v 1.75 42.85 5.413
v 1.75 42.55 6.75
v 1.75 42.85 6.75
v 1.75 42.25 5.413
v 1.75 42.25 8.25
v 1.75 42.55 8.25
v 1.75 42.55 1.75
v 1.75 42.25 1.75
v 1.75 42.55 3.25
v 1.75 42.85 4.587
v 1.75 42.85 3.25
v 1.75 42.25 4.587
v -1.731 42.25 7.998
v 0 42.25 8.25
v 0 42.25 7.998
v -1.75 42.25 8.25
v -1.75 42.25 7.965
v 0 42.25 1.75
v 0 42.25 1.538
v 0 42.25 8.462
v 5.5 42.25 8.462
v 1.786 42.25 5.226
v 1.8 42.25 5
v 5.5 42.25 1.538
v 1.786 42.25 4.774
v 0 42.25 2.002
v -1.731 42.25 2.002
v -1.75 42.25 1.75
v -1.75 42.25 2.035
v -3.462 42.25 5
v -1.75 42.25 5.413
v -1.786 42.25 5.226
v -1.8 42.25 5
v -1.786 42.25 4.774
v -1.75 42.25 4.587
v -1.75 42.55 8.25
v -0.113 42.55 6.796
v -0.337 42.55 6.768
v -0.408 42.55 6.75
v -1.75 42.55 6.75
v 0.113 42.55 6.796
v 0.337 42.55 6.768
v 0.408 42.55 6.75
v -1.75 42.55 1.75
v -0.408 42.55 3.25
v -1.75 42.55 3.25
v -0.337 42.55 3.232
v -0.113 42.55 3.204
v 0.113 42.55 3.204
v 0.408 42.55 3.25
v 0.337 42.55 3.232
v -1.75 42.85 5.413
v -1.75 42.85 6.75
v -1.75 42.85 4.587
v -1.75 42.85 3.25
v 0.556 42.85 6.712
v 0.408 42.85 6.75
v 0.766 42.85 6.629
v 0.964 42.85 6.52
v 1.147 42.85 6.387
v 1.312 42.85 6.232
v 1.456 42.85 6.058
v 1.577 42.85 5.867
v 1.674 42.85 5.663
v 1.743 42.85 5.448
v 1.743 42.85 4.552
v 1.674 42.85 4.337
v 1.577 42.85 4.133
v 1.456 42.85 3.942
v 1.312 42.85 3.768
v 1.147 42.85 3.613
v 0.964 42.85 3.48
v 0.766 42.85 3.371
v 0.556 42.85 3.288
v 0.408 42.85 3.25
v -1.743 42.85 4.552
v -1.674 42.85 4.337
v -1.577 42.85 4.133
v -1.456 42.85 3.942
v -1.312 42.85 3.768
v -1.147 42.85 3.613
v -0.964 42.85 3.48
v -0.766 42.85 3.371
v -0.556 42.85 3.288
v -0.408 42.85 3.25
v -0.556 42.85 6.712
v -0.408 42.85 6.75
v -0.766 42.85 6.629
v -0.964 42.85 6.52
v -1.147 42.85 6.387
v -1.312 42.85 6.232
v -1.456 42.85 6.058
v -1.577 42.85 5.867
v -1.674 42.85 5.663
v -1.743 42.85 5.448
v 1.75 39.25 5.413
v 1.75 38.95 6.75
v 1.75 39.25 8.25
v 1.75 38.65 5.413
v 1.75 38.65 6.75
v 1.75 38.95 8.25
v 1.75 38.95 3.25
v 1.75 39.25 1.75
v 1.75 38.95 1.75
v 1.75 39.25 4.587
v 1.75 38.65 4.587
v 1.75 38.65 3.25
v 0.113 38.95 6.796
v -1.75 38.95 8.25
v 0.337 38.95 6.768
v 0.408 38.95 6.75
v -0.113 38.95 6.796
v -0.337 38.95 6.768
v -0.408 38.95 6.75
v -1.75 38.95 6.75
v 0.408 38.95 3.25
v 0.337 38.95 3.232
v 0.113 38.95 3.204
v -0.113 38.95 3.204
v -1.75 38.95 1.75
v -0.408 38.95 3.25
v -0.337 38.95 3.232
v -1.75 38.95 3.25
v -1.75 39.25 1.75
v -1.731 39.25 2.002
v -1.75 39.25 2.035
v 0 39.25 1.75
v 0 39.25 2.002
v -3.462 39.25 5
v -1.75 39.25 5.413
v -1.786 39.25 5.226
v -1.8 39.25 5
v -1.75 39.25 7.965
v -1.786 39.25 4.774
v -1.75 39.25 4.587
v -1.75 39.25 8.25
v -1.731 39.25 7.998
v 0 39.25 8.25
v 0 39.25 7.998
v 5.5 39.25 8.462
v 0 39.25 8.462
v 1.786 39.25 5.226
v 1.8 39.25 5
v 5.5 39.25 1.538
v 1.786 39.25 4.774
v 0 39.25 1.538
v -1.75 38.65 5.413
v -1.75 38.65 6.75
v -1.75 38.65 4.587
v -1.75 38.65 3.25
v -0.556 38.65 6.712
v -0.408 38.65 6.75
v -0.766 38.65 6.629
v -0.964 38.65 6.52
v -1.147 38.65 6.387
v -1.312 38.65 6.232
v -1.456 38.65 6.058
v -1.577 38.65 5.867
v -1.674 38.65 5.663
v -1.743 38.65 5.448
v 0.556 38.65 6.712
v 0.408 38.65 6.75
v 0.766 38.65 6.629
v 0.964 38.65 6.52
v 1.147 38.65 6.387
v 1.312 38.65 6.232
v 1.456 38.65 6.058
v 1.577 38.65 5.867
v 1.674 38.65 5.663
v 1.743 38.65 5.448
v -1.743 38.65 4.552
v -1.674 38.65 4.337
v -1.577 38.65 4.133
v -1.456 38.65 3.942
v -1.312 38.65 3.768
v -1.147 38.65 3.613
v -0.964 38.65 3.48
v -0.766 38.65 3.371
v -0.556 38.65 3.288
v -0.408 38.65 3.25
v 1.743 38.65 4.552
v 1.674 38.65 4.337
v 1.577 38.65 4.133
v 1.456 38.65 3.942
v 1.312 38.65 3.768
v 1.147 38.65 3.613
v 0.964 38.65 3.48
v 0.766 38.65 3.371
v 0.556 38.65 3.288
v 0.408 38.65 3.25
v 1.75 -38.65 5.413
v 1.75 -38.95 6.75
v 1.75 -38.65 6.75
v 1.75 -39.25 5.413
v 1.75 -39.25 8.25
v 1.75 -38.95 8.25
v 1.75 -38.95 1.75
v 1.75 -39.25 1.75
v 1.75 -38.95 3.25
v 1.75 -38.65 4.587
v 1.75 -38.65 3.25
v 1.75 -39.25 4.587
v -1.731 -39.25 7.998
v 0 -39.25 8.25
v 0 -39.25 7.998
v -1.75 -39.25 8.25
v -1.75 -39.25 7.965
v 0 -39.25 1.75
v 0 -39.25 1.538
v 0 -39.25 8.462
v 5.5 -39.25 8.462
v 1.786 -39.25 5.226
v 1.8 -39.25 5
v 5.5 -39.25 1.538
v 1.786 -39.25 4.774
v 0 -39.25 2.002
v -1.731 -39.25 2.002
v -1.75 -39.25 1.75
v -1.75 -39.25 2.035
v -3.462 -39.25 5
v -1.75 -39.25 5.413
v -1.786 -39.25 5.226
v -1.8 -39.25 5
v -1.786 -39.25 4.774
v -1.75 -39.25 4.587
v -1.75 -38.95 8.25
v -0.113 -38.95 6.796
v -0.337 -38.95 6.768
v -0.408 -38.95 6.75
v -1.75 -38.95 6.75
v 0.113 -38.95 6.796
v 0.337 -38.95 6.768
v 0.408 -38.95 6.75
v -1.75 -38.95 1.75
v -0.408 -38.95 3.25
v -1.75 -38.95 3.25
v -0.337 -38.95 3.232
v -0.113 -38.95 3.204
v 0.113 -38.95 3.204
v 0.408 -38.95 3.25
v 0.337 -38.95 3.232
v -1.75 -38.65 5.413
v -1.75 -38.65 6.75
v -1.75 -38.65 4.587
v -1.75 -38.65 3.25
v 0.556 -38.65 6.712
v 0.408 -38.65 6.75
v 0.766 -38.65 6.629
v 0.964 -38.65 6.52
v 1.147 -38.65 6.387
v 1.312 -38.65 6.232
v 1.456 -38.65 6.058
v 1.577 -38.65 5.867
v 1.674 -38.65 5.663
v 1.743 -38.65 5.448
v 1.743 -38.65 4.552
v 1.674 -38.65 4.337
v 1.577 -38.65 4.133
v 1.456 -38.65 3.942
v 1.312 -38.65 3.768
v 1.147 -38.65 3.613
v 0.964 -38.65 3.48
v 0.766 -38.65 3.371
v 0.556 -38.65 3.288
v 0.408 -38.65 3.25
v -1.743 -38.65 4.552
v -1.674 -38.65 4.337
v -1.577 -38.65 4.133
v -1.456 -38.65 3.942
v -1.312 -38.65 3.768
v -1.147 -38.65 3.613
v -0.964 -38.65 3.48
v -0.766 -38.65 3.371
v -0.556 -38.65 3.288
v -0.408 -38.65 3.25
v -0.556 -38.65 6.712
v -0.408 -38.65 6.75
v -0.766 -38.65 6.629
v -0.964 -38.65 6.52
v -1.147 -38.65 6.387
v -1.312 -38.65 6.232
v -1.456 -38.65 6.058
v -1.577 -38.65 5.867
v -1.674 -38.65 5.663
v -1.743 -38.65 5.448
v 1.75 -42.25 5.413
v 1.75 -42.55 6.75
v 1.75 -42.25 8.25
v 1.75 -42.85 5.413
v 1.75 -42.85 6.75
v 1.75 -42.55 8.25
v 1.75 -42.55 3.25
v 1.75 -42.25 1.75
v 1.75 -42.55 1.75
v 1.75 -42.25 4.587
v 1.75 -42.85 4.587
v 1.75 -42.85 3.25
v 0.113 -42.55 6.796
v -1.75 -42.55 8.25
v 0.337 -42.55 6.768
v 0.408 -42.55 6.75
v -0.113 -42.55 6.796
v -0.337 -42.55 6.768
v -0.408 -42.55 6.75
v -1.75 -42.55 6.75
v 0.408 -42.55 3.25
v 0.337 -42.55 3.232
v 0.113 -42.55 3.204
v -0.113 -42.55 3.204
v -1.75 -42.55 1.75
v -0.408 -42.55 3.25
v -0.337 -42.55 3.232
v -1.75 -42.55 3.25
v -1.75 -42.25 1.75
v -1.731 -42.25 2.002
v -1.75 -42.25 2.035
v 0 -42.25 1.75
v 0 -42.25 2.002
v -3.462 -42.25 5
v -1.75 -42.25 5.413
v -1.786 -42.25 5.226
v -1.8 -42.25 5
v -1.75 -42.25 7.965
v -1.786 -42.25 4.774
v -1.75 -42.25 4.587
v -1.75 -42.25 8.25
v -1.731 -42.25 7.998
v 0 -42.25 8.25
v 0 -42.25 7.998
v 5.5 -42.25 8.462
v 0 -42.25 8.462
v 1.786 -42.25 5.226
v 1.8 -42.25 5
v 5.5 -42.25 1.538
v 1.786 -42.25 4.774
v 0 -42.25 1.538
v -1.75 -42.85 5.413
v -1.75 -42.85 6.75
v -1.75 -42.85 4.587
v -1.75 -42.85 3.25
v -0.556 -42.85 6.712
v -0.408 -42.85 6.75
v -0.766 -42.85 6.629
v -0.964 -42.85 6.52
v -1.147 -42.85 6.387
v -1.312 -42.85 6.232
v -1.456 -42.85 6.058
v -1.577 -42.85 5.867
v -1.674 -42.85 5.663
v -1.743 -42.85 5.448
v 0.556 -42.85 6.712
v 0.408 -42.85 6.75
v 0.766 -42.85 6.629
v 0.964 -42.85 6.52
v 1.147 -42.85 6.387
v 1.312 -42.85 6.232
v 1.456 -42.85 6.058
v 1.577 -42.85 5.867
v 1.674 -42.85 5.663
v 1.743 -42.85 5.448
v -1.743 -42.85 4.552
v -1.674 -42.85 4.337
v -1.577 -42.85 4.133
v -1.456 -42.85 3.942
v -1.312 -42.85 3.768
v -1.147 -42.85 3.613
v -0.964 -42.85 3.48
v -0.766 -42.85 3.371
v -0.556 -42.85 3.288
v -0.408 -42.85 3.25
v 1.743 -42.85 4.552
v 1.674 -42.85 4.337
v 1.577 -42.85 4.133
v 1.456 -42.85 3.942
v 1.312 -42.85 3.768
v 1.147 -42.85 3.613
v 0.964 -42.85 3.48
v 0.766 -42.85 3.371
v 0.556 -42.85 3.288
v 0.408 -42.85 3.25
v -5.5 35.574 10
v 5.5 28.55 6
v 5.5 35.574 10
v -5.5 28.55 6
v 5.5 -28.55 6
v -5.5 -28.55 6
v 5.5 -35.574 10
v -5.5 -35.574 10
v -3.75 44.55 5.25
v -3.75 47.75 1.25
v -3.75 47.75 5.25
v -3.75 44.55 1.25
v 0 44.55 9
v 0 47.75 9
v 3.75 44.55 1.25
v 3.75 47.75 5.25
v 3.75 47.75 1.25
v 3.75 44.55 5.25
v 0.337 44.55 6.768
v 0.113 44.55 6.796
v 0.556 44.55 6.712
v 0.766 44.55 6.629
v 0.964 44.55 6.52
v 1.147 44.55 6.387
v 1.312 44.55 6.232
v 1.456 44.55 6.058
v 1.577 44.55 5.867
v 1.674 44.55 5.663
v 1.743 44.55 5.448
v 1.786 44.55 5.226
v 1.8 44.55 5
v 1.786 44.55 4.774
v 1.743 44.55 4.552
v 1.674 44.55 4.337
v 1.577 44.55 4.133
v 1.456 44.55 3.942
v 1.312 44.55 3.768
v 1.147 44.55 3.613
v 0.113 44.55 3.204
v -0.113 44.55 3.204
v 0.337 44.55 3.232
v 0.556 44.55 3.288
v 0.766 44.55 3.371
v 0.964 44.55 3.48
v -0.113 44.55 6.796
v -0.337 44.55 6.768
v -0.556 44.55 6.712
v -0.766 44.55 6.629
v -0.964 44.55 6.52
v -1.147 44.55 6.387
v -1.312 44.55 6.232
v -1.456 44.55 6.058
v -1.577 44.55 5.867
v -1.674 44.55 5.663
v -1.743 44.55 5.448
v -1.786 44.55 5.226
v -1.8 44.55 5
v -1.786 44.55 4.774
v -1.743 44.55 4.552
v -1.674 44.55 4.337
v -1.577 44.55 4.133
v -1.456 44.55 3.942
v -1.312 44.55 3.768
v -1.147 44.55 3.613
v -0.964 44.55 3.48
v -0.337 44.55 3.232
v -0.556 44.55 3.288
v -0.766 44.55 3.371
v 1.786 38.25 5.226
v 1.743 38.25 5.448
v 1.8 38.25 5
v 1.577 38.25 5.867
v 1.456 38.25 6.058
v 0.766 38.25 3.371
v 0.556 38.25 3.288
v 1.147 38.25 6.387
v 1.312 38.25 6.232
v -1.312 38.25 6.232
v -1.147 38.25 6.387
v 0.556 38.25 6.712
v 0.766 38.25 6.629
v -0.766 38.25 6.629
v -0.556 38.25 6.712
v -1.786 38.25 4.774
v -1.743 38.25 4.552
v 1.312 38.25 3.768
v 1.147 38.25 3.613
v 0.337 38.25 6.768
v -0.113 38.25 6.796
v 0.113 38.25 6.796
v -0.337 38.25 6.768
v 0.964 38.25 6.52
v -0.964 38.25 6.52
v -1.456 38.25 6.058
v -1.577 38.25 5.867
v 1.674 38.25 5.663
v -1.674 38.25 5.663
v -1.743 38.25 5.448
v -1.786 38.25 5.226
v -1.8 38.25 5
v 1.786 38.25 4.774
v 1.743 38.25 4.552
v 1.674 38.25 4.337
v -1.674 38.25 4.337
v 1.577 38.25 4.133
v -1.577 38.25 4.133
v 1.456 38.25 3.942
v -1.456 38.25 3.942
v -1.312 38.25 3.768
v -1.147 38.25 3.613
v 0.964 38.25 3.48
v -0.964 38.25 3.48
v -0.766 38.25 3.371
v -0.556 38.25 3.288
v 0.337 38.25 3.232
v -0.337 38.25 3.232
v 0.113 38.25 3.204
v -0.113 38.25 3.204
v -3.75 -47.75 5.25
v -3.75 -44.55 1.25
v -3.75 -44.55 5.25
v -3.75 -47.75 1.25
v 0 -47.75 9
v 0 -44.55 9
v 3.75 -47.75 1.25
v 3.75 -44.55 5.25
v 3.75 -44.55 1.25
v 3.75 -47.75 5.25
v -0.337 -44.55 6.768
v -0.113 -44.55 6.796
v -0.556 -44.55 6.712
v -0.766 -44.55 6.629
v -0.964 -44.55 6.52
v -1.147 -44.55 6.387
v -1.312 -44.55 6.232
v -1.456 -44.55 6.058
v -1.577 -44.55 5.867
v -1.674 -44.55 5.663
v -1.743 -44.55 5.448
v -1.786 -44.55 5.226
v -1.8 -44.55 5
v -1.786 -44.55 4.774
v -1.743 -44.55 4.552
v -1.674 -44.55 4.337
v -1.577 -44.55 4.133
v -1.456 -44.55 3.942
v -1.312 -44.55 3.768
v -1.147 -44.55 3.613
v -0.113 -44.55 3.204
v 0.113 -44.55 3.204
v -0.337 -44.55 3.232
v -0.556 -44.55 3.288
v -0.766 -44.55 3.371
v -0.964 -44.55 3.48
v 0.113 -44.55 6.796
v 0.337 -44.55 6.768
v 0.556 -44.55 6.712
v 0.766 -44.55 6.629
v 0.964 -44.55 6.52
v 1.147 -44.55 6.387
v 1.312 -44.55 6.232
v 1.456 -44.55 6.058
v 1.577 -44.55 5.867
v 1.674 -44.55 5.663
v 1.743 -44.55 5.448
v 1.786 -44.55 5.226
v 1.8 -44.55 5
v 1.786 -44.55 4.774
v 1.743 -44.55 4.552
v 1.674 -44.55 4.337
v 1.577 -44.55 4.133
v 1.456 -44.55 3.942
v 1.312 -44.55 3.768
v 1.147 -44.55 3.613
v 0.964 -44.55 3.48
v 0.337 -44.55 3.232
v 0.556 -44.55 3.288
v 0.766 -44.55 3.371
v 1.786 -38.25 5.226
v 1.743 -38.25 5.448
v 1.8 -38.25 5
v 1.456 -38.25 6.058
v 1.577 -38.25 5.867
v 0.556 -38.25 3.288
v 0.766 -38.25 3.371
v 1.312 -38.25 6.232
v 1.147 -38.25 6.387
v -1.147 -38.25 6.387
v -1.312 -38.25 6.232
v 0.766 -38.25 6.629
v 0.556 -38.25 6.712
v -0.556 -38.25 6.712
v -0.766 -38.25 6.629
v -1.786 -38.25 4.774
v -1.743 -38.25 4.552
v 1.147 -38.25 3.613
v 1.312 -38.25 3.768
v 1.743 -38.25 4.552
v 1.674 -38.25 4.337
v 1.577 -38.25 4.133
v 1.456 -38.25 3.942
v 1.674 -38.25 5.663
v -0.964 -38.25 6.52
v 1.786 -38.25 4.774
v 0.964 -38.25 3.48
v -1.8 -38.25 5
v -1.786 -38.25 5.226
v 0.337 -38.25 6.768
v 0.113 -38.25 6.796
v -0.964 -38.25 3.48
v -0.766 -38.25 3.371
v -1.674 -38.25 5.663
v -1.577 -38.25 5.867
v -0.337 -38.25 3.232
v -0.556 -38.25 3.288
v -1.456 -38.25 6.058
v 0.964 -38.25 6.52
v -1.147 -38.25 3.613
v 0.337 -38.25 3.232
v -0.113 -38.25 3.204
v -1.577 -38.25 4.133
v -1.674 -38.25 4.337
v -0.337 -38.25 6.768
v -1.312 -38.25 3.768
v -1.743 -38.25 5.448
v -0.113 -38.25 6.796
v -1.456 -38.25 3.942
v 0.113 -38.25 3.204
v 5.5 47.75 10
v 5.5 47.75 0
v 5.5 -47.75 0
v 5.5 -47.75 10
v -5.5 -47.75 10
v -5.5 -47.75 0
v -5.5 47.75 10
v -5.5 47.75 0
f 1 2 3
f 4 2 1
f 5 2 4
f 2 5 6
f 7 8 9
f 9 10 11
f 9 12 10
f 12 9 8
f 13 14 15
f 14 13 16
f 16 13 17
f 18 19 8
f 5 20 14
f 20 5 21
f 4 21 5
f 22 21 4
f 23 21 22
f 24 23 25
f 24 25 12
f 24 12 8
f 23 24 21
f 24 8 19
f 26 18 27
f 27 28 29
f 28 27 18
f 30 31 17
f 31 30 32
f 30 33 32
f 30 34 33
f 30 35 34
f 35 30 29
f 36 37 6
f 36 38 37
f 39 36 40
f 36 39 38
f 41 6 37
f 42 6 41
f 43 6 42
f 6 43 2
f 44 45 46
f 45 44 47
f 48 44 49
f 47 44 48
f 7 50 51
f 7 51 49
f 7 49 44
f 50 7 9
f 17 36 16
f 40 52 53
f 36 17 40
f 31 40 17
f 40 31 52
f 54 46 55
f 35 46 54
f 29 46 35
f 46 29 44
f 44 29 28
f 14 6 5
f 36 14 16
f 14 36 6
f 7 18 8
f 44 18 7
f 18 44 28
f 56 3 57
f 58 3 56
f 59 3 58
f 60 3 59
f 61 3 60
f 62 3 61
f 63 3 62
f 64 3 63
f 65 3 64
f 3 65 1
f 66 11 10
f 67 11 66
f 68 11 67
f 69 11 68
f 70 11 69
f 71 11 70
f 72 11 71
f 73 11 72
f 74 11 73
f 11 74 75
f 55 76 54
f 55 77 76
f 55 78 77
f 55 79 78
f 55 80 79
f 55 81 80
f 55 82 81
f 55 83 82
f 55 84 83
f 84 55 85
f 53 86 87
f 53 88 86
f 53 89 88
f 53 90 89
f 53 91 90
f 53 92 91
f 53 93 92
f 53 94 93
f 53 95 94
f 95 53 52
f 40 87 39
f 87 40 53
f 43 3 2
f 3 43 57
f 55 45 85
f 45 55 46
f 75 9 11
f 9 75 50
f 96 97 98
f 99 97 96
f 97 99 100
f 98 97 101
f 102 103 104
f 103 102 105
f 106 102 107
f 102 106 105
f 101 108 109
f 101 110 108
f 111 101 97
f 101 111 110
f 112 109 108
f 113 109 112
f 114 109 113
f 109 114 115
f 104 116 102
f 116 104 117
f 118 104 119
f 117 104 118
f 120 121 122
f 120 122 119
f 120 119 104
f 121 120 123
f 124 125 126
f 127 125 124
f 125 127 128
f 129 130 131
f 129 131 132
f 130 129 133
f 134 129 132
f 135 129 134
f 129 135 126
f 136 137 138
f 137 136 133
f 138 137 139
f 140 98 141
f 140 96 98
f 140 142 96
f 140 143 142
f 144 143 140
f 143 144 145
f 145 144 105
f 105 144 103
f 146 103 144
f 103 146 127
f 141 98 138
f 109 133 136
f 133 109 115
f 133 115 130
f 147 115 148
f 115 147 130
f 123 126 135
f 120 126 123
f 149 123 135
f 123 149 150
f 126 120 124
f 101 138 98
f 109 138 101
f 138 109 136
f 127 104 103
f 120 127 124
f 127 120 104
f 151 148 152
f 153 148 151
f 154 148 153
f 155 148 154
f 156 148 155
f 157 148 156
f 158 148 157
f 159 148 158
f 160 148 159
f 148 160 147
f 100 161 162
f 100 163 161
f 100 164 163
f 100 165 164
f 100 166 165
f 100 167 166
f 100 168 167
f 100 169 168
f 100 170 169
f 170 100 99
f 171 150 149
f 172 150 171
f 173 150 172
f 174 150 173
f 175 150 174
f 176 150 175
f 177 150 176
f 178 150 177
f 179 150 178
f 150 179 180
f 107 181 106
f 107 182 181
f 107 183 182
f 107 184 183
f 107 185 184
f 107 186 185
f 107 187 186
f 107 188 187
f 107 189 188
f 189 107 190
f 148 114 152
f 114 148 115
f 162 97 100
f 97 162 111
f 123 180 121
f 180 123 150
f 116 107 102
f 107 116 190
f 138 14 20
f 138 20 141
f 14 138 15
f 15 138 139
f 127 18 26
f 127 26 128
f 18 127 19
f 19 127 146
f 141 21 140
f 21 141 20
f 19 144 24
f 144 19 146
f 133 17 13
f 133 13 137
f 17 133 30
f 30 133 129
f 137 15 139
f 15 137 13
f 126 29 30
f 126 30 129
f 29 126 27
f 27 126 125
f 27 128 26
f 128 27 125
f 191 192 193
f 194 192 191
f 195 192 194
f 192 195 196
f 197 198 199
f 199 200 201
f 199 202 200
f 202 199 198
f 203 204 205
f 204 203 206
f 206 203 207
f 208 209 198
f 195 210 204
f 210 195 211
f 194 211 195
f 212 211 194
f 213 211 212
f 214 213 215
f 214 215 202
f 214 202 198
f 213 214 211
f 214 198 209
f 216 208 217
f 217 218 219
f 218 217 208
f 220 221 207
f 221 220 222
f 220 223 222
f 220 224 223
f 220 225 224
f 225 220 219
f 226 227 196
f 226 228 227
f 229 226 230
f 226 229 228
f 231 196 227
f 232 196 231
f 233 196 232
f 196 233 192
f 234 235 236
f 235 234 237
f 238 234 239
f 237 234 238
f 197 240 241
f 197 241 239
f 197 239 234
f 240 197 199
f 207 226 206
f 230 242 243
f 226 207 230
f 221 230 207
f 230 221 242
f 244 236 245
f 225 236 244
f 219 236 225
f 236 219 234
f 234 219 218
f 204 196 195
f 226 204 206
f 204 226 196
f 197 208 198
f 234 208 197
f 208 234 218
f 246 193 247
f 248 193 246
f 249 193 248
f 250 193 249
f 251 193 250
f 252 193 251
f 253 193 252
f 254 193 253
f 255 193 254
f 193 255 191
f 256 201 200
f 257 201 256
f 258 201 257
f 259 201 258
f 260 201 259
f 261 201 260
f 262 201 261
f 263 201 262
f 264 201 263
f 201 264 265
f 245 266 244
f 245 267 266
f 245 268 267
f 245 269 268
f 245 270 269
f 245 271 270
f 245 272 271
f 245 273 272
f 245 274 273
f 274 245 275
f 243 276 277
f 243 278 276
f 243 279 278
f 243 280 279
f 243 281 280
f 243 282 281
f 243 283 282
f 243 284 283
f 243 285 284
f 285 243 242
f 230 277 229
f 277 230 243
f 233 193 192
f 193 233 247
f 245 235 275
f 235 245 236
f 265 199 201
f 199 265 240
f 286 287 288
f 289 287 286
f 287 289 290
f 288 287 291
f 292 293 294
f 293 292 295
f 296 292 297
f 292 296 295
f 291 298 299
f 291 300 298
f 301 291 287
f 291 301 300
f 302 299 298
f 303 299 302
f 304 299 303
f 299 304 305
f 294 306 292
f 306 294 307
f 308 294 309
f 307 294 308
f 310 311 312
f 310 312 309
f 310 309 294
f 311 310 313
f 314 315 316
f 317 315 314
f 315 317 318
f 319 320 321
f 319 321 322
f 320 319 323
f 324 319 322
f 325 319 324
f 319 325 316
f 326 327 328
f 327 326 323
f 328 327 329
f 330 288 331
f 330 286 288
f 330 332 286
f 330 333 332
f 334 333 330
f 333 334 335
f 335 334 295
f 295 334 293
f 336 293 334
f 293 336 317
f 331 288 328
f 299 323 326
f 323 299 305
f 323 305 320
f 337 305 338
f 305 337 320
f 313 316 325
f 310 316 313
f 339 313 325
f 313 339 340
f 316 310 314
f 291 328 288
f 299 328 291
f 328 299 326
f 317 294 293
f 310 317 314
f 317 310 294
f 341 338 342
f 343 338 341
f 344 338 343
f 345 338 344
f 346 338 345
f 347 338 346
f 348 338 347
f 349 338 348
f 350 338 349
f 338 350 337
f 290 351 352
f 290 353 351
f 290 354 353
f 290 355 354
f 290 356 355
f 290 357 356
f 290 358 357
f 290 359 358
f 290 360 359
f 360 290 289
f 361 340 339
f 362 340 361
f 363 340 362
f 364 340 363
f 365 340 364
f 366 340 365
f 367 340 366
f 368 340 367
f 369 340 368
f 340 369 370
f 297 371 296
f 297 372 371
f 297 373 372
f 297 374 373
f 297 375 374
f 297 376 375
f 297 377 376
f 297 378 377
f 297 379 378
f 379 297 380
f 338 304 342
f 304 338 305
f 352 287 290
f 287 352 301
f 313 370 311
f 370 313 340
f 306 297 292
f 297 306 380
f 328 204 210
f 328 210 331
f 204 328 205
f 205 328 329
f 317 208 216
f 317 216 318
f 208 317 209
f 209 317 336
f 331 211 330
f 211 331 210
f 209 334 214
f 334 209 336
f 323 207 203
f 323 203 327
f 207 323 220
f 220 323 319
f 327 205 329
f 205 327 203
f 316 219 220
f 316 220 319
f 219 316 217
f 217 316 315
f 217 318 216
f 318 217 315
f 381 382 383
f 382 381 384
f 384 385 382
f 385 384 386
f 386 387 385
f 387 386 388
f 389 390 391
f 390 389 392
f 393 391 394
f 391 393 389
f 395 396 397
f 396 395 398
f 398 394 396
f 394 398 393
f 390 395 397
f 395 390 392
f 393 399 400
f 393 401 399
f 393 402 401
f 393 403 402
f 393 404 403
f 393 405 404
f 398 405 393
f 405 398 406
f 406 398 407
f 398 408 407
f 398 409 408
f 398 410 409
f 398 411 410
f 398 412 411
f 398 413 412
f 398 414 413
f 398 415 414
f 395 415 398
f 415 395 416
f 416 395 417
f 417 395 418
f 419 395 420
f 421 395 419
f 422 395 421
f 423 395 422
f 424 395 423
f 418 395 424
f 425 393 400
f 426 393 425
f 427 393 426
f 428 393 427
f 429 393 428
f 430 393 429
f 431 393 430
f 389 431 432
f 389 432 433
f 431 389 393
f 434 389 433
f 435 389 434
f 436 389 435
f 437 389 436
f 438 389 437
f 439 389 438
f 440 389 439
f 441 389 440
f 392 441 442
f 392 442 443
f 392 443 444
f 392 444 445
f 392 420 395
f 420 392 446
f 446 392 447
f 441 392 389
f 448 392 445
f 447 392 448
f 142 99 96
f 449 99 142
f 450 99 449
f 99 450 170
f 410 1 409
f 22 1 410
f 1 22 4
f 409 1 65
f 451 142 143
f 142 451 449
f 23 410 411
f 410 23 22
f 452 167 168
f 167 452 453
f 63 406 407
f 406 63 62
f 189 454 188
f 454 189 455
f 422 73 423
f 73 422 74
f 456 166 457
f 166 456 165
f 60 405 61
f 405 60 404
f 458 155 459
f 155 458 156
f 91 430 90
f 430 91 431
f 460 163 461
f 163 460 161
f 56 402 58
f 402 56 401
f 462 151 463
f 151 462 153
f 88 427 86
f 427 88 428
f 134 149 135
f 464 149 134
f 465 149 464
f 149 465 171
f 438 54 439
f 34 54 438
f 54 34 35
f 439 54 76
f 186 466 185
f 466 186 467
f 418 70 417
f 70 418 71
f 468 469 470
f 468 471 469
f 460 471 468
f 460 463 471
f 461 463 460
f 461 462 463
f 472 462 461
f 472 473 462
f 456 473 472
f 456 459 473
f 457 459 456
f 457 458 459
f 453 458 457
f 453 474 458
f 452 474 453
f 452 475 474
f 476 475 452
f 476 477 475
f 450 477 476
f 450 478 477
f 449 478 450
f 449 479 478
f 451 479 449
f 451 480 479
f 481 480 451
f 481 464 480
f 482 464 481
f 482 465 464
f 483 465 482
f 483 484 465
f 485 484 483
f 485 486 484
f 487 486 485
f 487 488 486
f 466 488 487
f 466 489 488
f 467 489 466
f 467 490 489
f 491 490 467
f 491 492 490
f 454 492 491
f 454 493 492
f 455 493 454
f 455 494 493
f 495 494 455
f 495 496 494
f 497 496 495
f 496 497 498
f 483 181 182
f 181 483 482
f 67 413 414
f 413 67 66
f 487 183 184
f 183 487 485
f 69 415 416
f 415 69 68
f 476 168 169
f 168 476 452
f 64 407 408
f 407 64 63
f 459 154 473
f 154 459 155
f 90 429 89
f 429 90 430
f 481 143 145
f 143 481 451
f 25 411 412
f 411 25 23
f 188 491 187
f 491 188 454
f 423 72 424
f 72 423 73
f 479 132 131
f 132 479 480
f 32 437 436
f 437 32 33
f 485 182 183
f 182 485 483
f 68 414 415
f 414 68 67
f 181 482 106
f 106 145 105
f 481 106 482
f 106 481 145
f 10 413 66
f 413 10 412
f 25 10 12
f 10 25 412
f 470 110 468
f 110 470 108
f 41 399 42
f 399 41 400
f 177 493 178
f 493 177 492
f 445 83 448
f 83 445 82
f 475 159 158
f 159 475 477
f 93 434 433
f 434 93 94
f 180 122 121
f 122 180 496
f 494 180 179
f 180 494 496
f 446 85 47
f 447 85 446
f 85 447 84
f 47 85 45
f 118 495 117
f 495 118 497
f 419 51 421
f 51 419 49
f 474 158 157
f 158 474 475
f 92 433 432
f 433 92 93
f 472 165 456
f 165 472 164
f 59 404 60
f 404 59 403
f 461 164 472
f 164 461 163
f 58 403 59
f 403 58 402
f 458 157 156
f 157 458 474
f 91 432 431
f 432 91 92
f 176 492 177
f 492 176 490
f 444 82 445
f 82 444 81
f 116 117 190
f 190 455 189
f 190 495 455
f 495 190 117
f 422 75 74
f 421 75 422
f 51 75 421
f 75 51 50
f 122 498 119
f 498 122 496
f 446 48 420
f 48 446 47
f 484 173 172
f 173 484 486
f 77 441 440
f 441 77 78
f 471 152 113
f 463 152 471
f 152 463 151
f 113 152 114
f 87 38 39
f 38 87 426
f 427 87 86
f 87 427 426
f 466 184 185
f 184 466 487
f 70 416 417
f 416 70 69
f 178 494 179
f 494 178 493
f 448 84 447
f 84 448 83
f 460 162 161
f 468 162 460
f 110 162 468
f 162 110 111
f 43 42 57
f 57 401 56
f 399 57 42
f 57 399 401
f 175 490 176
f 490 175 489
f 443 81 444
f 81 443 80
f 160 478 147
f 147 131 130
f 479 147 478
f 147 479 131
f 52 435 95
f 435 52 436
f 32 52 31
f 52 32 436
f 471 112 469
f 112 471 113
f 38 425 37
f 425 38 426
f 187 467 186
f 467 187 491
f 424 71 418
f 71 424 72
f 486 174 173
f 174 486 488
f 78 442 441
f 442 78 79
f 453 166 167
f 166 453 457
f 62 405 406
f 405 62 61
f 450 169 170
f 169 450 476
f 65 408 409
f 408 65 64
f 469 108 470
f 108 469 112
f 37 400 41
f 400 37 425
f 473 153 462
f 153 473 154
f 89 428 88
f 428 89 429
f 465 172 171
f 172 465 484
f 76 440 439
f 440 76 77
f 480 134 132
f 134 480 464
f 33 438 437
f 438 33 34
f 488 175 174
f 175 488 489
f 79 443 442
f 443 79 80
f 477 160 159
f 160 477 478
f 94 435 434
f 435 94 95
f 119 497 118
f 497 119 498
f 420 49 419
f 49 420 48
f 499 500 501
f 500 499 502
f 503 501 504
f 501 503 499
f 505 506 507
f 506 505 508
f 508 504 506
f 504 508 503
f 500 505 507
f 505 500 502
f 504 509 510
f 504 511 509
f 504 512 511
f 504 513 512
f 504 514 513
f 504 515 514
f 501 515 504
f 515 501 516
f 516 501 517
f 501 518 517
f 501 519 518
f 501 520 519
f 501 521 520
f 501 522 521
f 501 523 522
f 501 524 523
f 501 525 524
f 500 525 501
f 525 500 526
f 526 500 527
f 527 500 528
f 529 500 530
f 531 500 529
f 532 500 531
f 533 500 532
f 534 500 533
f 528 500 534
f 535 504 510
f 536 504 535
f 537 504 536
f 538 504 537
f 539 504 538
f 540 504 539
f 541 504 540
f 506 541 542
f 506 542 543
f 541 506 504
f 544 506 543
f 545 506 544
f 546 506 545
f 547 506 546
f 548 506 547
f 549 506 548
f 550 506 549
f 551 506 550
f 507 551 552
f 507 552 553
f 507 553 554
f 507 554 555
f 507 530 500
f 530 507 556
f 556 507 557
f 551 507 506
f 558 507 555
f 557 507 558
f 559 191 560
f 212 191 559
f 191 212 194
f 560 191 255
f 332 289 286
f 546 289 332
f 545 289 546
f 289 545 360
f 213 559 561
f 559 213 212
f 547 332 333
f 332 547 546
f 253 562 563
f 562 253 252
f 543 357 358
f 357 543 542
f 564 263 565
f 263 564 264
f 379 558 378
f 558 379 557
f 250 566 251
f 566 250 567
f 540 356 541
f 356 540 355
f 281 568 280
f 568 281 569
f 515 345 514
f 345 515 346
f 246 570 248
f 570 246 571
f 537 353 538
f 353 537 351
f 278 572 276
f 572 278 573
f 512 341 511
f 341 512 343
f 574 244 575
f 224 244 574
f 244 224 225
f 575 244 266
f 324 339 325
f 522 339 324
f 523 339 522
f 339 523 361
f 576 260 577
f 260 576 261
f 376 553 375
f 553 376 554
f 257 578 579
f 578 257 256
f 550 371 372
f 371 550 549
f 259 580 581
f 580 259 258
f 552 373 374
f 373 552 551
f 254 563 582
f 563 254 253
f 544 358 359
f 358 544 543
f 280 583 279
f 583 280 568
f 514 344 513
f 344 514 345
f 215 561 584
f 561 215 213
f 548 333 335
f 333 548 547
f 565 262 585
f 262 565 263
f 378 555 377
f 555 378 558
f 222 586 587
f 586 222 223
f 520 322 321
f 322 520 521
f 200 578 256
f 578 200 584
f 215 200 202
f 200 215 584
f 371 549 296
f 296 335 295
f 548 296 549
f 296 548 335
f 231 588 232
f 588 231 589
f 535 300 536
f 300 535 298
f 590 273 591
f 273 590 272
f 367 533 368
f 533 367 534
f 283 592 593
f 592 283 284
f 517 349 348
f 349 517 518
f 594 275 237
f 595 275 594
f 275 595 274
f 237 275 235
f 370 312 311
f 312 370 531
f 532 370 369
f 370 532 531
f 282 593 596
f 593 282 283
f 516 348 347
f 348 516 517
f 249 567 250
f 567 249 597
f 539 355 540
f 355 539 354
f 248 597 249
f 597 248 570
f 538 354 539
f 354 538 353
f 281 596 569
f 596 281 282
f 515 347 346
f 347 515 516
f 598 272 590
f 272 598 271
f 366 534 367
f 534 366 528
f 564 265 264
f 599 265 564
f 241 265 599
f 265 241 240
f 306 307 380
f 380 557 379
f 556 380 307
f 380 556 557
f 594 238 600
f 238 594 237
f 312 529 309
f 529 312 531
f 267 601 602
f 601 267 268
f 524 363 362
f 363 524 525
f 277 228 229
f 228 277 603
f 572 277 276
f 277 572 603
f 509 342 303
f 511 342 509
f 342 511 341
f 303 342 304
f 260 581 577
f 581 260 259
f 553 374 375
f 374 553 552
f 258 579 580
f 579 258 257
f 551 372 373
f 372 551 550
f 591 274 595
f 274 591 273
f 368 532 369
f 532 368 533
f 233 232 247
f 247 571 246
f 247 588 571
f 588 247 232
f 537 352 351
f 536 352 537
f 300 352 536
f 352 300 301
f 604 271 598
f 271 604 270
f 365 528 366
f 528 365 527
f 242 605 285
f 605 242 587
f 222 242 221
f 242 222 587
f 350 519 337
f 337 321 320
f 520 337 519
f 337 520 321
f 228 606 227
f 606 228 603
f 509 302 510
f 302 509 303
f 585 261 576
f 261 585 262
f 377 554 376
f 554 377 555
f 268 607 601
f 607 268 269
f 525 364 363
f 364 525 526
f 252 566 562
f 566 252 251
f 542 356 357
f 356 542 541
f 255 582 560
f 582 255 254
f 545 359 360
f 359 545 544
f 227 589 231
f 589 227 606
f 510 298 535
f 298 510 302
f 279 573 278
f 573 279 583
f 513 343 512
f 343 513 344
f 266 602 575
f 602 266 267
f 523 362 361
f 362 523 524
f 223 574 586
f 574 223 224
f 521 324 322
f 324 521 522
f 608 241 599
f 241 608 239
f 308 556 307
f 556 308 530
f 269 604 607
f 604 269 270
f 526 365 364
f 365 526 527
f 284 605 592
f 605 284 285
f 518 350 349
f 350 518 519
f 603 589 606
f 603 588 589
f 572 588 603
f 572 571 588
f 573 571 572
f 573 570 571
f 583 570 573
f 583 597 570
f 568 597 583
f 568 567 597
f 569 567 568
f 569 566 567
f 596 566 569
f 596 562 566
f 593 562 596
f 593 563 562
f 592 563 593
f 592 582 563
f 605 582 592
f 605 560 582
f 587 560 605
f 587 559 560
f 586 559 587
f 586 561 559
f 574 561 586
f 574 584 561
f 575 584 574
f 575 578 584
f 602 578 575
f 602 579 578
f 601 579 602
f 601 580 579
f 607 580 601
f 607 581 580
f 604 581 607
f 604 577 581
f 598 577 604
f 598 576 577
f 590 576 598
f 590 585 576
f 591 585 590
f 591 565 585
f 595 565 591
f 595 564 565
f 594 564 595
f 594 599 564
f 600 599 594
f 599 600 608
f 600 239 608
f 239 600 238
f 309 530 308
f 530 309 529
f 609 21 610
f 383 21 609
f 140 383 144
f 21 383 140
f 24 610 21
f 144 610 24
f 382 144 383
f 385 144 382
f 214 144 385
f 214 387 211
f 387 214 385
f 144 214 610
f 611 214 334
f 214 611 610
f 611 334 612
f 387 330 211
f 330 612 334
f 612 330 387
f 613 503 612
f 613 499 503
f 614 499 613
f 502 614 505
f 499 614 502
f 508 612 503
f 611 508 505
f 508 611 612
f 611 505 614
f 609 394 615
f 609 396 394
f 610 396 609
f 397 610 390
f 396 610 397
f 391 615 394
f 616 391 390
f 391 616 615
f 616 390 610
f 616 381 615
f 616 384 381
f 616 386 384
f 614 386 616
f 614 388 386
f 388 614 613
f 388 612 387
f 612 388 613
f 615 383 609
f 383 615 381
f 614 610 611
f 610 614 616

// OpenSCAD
$fn = 50;

difference() {
	union() {
		translate(v = [0.0, 47.75, 0]) {
			rotate(a = [90, 0, 0]) {
				difference() {
					union() {
						translate(v = [-5.5, 0, 0]) {
							cube(size = [11.0, 10.0, 95.5]);
						}
					}
					union() {
						translate(v = [0, 5.0, 5.5]) {
							rotate(a = [0, 0, 0]) {
								difference() {
									union() {
										translate(v = [-1.75, -3.25, -0.3]) {
											cube(size = [3.5, 6.5, 0.3]);
										}
										translate(v = [-1.75, -1.75, -0.6]) {
											cube(size = [3.5, 3.5, 0.3]);
										}
										translate(v = [-1.75, -3.25, 3]) {
											cube(size = [3.5, 6.5, 0.3]);
										}
										translate(v = [-1.75, -1.75, 3.3]) {
											cube(size = [3.5, 3.5, 0.3]);
										}
										translate(v = [0.0, -3.4619999999999997, 0]) {
											cube(size = [20, 6.9239999999999995, 3]);
										}
										linear_extrude(height = 3) {
											polygon(points = [[3.4619999999999997, 0.0], [1.7310000000000003, 2.9981799479017264], [-1.7309999999999992, 2.9981799479017264], [-3.4619999999999997, 4.2397272186481365e-16], [-1.7310000000000014, -2.998179947901726], [1.7309999999999977, -2.9981799479017277]]);
										}
										translate(v = [-1.75, -3.25, -0.3]) {
											cube(size = [3.5, 6.5, 0.3]);
										}
										translate(v = [-1.75, -1.75, -0.6]) {
											cube(size = [3.5, 3.5, 0.3]);
										}
										translate(v = [-1.75, -3.25, 3]) {
											cube(size = [3.5, 6.5, 0.3]);
										}
										translate(v = [-1.75, -1.75, 3.3]) {
											cube(size = [3.5, 3.5, 0.3]);
										}
										translate(v = [-1.75, -3.25, -0.3]) {
											cube(size = [3.5, 6.5, 0.3]);
										}
										translate(v = [-1.75, -1.75, -0.6]) {
											cube(size = [3.5, 3.5, 0.3]);
										}
										translate(v = [-1.75, -3.25, 3]) {
											cube(size = [3.5, 6.5, 0.3]);
										}
										translate(v = [-1.75, -1.75, 3.3]) {
											cube(size = [3.5, 3.5, 0.3]);
										}
									}
									union();
								}
							}
						}
						translate(v = [0, 5.0, 87.0]) {
							rotate(a = [0, 0, 0]) {
								difference() {
									union() {
										translate(v = [-1.75, -3.25, -0.3]) {
											cube(size = [3.5, 6.5, 0.3]);
										}
										translate(v = [-1.75, -1.75, -0.6]) {
											cube(size = [3.5, 3.5, 0.3]);
										}
										translate(v = [-1.75, -3.25, 3]) {
											cube(size = [3.5, 6.5, 0.3]);
										}
										translate(v = [-1.75, -1.75, 3.3]) {
											cube(size = [3.5, 3.5, 0.3]);
										}
										translate(v = [0.0, -3.4619999999999997, 0]) {
											cube(size = [20, 6.9239999999999995, 3]);
										}
										linear_extrude(height = 3) {
											polygon(points = [[3.4619999999999997, 0.0], [1.7310000000000003, 2.9981799479017264], [-1.7309999999999992, 2.9981799479017264], [-3.4619999999999997, 4.2397272186481365e-16], [-1.7310000000000014, -2.998179947901726], [1.7309999999999977, -2.9981799479017277]]);
										}
										translate(v = [-1.75, -3.25, -0.3]) {
											cube(size = [3.5, 6.5, 0.3]);
										}
										translate(v = [-1.75, -1.75, -0.6]) {
											cube(size = [3.5, 3.5, 0.3]);
										}
										translate(v = [-1.75, -3.25, 3]) {
											cube(size = [3.5, 6.5, 0.3]);
										}
										translate(v = [-1.75, -1.75, 3.3]) {
											cube(size = [3.5, 3.5, 0.3]);
										}
										translate(v = [-1.75, -3.25, -0.3]) {
											cube(size = [3.5, 6.5, 0.3]);
										}
										translate(v = [-1.75, -1.75, -0.6]) {
											cube(size = [3.5, 3.5, 0.3]);
										}
										translate(v = [-1.75, -3.25, 3]) {
											cube(size = [3.5, 6.5, 0.3]);
										}
										translate(v = [-1.75, -1.75, 3.3]) {
											cube(size = [3.5, 3.5, 0.3]);
										}
									}
									union();
								}
							}
						}
						translate(v = [-5.6, 0, 0]) {
							rotate(a = [90, 0, 90]) {
								linear_extrude(height = 11.2) {
									polygon(points = [[10.1, 12.0], [10.1, 83.5], [6.0, 76.3], [6.0, 19.2]]);
								}
							}
						}
						translate(v = [0, 0, -0.1]) {
							linear_extrude(height = 3.3000000000000003) {
								polygon(points = [[-3.75, 1.25], [3.75, 1.25], [3.75, 5.25], [0, 9.0], [-3.75, 5.25]]);
							}
						}
						translate(v = [0, 5.0, -0.1]) {
							cylinder(h = 9.6, r = 1.8);
						}
						translate(v = [0, 0, 92.3]) {
							linear_extrude(height = 3.3000000000000003) {
								polygon(points = [[-3.75, 1.25], [3.75, 1.25], [3.75, 5.25], [0, 9.0], [-3.75, 5.25]]);
							}
						}
						translate(v = [0, 5.0, 86.0]) {
							cylinder(h = 9.6, r = 1.8);
						}
					}
				}
			}
		}
	}
	union();
}
